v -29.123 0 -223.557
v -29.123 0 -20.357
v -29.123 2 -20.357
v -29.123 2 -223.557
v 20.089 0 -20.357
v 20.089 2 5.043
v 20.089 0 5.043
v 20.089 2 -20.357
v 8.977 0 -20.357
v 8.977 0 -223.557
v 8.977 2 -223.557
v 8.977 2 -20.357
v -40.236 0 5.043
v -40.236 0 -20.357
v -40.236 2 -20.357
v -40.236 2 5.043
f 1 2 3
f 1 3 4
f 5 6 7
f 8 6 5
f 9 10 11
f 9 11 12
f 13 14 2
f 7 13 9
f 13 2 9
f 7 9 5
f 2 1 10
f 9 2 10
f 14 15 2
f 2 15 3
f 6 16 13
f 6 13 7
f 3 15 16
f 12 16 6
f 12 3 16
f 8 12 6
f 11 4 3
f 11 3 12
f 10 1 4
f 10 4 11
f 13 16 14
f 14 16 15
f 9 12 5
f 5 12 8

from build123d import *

# Parameters (mm, degrees)
BOSS_EXTRUDE1_DEPTH = 2
SKETCH8_W           = 25.4
SKETCH8_H           = 25.4
BOSS_EXTRUDE2_DEPTH = 2


with BuildPart() as part:
    # Sketch1 → Boss-Extrude1 (new body)
    with BuildSketch(Plane(origin=(0, 0, 0), x_dir=(1, 0, 0), z_dir=(0, 1, 0))):
        Polygon((-29.123295379, 223.557352941), (8.976704621, 223.557352941), (8.976704621, 20.357352941), (-5.310795379, 20.357352941), (-5.310795379, -5.042647059), (-14.835795379, -5.042647059), (-14.835795379, 20.357352941), (-29.123295379, 20.357352941), align=None)
    extrude(amount=BOSS_EXTRUDE1_DEPTH)

    # Sketch8 → Boss-Extrude2 (add)
    with BuildSketch(Plane(origin=(0, 2, 0), x_dir=(1, 0, 0), z_dir=(0, 1, 0))):
        with Locations((-27.535795379, 7.657352941)):
            Rectangle(SKETCH8_W, SKETCH8_H)
        with Locations((7.389204621, 7.657352941)):
            Rectangle(SKETCH8_W, SKETCH8_H)
    extrude(amount=-BOSS_EXTRUDE2_DEPTH)


solid = part.part
